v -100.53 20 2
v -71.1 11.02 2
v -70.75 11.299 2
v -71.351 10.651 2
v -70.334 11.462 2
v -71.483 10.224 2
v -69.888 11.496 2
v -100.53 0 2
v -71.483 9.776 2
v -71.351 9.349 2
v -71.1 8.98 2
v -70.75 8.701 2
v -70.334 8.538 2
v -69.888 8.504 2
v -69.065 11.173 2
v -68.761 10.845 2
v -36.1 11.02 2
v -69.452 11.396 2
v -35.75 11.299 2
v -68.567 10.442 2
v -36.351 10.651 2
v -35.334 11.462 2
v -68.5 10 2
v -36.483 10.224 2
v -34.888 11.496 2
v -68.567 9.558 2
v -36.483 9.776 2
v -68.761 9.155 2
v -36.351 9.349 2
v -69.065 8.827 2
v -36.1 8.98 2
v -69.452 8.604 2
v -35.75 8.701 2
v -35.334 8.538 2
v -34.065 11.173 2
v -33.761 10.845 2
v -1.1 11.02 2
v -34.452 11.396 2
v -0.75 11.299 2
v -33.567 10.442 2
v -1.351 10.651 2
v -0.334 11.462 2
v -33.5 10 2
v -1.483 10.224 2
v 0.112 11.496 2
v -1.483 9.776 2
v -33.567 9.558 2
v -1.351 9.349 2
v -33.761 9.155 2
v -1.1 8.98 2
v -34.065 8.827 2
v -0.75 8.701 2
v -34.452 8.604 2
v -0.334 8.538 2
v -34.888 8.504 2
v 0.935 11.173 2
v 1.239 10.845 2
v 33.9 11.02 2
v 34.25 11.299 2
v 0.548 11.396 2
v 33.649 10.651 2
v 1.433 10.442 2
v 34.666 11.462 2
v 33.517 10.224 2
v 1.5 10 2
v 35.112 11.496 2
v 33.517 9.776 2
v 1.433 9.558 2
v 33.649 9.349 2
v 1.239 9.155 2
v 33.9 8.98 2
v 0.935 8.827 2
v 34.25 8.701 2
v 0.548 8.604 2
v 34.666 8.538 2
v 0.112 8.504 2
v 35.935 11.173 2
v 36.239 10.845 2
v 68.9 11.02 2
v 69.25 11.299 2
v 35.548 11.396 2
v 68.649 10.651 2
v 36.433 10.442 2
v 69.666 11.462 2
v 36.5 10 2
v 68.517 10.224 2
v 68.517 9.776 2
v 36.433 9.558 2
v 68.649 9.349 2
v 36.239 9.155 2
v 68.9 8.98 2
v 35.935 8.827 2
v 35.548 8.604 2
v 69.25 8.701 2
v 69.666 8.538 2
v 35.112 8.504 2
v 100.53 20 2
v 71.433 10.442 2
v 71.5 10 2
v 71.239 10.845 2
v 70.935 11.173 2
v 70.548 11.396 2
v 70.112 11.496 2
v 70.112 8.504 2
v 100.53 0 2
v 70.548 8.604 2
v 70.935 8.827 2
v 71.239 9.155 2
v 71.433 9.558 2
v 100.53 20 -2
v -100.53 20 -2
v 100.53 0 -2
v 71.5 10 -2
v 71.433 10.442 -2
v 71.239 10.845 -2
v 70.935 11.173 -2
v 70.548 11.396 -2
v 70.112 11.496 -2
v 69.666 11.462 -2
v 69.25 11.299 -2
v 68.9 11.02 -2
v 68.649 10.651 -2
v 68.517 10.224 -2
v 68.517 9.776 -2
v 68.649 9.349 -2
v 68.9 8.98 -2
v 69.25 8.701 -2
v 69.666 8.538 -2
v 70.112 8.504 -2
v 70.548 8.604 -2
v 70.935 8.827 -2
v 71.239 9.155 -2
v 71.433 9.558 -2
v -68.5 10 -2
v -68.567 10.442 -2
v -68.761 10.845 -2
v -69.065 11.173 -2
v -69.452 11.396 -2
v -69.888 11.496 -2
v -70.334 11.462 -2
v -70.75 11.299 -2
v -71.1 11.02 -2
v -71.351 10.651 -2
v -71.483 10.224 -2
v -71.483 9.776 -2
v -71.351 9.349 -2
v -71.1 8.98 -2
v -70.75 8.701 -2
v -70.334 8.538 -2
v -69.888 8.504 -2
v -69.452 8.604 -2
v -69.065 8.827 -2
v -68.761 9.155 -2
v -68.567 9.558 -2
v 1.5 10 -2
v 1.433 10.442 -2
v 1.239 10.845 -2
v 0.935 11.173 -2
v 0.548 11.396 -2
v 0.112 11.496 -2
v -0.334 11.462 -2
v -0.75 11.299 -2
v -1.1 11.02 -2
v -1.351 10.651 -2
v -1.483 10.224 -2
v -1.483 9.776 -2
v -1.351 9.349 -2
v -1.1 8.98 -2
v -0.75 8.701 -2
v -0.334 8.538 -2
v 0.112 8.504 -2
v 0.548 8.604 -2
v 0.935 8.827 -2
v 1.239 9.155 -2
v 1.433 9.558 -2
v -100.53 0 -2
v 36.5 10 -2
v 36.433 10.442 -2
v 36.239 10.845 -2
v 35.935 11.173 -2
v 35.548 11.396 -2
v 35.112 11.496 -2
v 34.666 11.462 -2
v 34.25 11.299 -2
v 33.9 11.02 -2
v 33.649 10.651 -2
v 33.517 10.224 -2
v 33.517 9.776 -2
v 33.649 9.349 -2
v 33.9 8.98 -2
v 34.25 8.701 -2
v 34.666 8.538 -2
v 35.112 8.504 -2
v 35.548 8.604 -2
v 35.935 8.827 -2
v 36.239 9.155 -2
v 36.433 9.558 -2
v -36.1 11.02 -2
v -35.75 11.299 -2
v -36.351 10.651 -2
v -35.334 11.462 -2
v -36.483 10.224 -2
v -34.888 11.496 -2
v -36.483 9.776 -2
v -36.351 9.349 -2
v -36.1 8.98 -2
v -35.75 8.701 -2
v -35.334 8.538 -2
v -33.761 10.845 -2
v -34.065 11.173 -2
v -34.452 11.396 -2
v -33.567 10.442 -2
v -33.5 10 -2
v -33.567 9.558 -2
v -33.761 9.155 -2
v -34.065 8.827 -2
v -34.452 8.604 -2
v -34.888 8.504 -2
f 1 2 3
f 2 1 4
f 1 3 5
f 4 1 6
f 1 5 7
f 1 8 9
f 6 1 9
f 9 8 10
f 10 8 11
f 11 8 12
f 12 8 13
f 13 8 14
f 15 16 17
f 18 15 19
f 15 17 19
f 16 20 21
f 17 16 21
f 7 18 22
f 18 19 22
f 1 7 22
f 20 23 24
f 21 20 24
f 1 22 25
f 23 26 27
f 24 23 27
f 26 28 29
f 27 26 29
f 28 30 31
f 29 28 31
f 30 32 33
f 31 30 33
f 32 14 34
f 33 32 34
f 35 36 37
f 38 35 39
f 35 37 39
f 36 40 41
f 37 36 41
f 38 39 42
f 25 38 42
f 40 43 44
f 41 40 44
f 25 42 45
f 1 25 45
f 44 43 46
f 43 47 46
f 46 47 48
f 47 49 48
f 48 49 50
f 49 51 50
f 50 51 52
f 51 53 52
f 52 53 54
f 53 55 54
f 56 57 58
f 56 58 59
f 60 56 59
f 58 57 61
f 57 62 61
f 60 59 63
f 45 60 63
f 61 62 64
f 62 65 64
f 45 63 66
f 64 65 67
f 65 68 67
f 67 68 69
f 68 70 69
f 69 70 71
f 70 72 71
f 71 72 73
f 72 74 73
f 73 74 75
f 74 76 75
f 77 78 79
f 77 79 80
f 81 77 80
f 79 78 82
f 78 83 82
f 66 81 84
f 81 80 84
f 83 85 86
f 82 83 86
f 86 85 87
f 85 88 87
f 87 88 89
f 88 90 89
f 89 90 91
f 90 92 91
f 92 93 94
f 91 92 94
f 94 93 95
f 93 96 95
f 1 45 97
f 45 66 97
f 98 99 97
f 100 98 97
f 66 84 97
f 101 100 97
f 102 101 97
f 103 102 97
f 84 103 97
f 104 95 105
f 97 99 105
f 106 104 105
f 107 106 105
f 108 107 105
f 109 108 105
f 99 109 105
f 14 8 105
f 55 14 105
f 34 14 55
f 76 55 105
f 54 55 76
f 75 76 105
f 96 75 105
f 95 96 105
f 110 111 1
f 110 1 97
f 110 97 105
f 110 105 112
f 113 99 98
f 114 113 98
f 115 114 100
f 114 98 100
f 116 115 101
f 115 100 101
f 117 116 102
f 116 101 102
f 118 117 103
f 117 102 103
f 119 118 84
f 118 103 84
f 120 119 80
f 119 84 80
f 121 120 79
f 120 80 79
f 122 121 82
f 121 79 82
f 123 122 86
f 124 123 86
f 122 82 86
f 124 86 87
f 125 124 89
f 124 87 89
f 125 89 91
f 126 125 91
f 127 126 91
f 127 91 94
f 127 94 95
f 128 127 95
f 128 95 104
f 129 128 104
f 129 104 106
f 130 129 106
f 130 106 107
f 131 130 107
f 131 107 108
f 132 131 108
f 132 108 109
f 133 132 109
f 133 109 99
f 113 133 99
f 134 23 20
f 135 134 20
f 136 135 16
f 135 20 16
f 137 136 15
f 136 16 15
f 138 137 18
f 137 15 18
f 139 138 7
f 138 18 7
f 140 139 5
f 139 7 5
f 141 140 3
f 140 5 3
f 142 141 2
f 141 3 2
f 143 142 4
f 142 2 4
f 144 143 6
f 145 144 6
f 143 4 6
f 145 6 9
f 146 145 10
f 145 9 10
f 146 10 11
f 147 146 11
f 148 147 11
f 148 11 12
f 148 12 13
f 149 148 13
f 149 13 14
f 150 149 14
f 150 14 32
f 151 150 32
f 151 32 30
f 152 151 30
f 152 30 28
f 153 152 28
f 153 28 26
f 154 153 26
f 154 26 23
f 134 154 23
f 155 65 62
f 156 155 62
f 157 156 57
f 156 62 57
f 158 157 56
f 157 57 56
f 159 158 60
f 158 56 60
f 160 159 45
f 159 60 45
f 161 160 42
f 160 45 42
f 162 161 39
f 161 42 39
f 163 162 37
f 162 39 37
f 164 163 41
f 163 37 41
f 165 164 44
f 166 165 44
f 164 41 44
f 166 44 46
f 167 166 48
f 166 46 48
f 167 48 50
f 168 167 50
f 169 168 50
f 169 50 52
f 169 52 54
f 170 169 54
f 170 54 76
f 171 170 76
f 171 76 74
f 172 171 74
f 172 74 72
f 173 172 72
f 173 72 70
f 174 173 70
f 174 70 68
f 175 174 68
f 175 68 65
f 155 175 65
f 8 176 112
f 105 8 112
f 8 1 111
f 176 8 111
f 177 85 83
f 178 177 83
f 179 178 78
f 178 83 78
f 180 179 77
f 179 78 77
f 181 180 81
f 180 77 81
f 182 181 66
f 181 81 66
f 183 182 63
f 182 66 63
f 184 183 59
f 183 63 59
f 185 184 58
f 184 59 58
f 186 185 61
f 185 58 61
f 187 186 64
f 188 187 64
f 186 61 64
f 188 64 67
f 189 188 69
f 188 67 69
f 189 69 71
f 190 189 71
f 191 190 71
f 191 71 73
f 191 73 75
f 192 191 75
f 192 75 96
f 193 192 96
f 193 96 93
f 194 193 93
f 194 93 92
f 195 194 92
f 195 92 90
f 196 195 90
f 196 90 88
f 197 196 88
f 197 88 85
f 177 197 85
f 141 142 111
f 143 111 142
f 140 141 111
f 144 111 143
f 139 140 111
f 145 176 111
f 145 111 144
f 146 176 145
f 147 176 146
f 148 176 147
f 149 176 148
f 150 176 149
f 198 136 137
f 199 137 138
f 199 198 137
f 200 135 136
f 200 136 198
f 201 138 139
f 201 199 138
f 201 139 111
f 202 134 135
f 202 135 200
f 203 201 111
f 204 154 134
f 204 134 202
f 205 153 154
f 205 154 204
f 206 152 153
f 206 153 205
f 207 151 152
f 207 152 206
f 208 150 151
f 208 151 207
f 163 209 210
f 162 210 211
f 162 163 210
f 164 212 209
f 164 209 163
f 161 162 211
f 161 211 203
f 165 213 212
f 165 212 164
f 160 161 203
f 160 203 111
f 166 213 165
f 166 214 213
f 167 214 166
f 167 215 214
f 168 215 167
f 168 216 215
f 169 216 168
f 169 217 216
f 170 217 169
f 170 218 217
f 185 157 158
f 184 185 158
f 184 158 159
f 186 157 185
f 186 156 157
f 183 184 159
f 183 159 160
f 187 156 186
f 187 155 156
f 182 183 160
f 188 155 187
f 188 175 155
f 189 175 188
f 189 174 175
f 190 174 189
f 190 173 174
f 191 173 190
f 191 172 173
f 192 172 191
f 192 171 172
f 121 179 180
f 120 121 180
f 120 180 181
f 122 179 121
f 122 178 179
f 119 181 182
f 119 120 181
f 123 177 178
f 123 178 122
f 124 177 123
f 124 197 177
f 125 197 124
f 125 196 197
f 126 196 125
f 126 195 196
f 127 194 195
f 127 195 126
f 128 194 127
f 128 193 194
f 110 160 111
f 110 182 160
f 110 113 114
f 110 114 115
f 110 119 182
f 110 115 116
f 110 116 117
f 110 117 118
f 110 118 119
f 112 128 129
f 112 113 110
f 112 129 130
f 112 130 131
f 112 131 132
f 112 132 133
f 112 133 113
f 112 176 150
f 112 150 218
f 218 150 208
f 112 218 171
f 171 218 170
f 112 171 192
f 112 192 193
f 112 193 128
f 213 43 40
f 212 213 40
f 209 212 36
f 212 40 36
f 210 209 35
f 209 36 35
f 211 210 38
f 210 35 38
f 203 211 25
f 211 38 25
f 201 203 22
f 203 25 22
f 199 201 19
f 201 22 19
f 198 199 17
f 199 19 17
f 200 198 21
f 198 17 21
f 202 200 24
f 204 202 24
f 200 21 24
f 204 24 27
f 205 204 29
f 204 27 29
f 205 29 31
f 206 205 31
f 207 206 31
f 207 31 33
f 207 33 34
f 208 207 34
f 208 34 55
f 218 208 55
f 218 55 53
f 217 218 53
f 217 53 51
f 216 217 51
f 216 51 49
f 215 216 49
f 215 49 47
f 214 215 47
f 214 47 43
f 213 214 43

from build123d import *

# Parameters (mm, degrees)
SKETCH1_W               = 201.06
SKETCH1_H               = 4
BOSS_EXTRUDE1_DEPTH     = 20
SKETCH2_R               = 1.5
CUT_EXTRUDE1_DEPTH      = 1
CUT_EXTRUDE1_DEPTH_BACK = 5


with BuildPart() as part:
    # Sketch1 → Boss-Extrude1 (new body)
    with BuildSketch(Plane(origin=(0, 0, 0), x_dir=(1, 0, 0), z_dir=(0, 1, 0))):
        Rectangle(SKETCH1_W, SKETCH1_H)
    extrude(amount=BOSS_EXTRUDE1_DEPTH)

    # Sketch2 → Cut-Extrude1 (cut, two sides)
    with BuildSketch(Plane.XY.offset(2)) as cut_extrude1_sk:
        with Locations((-70, 10)):
            Circle(SKETCH2_R)
        with Locations((-35, 10)):
            Circle(SKETCH2_R)
        with Locations((0, 10)):
            Circle(SKETCH2_R)
        with Locations((35, 10)):
            Circle(SKETCH2_R)
        with Locations((70, 10)):
            Circle(SKETCH2_R)
    extrude(amount=CUT_EXTRUDE1_DEPTH, mode=Mode.SUBTRACT)
    extrude(cut_extrude1_sk.sketch, amount=-CUT_EXTRUDE1_DEPTH_BACK, mode=Mode.SUBTRACT)


solid = part.part
